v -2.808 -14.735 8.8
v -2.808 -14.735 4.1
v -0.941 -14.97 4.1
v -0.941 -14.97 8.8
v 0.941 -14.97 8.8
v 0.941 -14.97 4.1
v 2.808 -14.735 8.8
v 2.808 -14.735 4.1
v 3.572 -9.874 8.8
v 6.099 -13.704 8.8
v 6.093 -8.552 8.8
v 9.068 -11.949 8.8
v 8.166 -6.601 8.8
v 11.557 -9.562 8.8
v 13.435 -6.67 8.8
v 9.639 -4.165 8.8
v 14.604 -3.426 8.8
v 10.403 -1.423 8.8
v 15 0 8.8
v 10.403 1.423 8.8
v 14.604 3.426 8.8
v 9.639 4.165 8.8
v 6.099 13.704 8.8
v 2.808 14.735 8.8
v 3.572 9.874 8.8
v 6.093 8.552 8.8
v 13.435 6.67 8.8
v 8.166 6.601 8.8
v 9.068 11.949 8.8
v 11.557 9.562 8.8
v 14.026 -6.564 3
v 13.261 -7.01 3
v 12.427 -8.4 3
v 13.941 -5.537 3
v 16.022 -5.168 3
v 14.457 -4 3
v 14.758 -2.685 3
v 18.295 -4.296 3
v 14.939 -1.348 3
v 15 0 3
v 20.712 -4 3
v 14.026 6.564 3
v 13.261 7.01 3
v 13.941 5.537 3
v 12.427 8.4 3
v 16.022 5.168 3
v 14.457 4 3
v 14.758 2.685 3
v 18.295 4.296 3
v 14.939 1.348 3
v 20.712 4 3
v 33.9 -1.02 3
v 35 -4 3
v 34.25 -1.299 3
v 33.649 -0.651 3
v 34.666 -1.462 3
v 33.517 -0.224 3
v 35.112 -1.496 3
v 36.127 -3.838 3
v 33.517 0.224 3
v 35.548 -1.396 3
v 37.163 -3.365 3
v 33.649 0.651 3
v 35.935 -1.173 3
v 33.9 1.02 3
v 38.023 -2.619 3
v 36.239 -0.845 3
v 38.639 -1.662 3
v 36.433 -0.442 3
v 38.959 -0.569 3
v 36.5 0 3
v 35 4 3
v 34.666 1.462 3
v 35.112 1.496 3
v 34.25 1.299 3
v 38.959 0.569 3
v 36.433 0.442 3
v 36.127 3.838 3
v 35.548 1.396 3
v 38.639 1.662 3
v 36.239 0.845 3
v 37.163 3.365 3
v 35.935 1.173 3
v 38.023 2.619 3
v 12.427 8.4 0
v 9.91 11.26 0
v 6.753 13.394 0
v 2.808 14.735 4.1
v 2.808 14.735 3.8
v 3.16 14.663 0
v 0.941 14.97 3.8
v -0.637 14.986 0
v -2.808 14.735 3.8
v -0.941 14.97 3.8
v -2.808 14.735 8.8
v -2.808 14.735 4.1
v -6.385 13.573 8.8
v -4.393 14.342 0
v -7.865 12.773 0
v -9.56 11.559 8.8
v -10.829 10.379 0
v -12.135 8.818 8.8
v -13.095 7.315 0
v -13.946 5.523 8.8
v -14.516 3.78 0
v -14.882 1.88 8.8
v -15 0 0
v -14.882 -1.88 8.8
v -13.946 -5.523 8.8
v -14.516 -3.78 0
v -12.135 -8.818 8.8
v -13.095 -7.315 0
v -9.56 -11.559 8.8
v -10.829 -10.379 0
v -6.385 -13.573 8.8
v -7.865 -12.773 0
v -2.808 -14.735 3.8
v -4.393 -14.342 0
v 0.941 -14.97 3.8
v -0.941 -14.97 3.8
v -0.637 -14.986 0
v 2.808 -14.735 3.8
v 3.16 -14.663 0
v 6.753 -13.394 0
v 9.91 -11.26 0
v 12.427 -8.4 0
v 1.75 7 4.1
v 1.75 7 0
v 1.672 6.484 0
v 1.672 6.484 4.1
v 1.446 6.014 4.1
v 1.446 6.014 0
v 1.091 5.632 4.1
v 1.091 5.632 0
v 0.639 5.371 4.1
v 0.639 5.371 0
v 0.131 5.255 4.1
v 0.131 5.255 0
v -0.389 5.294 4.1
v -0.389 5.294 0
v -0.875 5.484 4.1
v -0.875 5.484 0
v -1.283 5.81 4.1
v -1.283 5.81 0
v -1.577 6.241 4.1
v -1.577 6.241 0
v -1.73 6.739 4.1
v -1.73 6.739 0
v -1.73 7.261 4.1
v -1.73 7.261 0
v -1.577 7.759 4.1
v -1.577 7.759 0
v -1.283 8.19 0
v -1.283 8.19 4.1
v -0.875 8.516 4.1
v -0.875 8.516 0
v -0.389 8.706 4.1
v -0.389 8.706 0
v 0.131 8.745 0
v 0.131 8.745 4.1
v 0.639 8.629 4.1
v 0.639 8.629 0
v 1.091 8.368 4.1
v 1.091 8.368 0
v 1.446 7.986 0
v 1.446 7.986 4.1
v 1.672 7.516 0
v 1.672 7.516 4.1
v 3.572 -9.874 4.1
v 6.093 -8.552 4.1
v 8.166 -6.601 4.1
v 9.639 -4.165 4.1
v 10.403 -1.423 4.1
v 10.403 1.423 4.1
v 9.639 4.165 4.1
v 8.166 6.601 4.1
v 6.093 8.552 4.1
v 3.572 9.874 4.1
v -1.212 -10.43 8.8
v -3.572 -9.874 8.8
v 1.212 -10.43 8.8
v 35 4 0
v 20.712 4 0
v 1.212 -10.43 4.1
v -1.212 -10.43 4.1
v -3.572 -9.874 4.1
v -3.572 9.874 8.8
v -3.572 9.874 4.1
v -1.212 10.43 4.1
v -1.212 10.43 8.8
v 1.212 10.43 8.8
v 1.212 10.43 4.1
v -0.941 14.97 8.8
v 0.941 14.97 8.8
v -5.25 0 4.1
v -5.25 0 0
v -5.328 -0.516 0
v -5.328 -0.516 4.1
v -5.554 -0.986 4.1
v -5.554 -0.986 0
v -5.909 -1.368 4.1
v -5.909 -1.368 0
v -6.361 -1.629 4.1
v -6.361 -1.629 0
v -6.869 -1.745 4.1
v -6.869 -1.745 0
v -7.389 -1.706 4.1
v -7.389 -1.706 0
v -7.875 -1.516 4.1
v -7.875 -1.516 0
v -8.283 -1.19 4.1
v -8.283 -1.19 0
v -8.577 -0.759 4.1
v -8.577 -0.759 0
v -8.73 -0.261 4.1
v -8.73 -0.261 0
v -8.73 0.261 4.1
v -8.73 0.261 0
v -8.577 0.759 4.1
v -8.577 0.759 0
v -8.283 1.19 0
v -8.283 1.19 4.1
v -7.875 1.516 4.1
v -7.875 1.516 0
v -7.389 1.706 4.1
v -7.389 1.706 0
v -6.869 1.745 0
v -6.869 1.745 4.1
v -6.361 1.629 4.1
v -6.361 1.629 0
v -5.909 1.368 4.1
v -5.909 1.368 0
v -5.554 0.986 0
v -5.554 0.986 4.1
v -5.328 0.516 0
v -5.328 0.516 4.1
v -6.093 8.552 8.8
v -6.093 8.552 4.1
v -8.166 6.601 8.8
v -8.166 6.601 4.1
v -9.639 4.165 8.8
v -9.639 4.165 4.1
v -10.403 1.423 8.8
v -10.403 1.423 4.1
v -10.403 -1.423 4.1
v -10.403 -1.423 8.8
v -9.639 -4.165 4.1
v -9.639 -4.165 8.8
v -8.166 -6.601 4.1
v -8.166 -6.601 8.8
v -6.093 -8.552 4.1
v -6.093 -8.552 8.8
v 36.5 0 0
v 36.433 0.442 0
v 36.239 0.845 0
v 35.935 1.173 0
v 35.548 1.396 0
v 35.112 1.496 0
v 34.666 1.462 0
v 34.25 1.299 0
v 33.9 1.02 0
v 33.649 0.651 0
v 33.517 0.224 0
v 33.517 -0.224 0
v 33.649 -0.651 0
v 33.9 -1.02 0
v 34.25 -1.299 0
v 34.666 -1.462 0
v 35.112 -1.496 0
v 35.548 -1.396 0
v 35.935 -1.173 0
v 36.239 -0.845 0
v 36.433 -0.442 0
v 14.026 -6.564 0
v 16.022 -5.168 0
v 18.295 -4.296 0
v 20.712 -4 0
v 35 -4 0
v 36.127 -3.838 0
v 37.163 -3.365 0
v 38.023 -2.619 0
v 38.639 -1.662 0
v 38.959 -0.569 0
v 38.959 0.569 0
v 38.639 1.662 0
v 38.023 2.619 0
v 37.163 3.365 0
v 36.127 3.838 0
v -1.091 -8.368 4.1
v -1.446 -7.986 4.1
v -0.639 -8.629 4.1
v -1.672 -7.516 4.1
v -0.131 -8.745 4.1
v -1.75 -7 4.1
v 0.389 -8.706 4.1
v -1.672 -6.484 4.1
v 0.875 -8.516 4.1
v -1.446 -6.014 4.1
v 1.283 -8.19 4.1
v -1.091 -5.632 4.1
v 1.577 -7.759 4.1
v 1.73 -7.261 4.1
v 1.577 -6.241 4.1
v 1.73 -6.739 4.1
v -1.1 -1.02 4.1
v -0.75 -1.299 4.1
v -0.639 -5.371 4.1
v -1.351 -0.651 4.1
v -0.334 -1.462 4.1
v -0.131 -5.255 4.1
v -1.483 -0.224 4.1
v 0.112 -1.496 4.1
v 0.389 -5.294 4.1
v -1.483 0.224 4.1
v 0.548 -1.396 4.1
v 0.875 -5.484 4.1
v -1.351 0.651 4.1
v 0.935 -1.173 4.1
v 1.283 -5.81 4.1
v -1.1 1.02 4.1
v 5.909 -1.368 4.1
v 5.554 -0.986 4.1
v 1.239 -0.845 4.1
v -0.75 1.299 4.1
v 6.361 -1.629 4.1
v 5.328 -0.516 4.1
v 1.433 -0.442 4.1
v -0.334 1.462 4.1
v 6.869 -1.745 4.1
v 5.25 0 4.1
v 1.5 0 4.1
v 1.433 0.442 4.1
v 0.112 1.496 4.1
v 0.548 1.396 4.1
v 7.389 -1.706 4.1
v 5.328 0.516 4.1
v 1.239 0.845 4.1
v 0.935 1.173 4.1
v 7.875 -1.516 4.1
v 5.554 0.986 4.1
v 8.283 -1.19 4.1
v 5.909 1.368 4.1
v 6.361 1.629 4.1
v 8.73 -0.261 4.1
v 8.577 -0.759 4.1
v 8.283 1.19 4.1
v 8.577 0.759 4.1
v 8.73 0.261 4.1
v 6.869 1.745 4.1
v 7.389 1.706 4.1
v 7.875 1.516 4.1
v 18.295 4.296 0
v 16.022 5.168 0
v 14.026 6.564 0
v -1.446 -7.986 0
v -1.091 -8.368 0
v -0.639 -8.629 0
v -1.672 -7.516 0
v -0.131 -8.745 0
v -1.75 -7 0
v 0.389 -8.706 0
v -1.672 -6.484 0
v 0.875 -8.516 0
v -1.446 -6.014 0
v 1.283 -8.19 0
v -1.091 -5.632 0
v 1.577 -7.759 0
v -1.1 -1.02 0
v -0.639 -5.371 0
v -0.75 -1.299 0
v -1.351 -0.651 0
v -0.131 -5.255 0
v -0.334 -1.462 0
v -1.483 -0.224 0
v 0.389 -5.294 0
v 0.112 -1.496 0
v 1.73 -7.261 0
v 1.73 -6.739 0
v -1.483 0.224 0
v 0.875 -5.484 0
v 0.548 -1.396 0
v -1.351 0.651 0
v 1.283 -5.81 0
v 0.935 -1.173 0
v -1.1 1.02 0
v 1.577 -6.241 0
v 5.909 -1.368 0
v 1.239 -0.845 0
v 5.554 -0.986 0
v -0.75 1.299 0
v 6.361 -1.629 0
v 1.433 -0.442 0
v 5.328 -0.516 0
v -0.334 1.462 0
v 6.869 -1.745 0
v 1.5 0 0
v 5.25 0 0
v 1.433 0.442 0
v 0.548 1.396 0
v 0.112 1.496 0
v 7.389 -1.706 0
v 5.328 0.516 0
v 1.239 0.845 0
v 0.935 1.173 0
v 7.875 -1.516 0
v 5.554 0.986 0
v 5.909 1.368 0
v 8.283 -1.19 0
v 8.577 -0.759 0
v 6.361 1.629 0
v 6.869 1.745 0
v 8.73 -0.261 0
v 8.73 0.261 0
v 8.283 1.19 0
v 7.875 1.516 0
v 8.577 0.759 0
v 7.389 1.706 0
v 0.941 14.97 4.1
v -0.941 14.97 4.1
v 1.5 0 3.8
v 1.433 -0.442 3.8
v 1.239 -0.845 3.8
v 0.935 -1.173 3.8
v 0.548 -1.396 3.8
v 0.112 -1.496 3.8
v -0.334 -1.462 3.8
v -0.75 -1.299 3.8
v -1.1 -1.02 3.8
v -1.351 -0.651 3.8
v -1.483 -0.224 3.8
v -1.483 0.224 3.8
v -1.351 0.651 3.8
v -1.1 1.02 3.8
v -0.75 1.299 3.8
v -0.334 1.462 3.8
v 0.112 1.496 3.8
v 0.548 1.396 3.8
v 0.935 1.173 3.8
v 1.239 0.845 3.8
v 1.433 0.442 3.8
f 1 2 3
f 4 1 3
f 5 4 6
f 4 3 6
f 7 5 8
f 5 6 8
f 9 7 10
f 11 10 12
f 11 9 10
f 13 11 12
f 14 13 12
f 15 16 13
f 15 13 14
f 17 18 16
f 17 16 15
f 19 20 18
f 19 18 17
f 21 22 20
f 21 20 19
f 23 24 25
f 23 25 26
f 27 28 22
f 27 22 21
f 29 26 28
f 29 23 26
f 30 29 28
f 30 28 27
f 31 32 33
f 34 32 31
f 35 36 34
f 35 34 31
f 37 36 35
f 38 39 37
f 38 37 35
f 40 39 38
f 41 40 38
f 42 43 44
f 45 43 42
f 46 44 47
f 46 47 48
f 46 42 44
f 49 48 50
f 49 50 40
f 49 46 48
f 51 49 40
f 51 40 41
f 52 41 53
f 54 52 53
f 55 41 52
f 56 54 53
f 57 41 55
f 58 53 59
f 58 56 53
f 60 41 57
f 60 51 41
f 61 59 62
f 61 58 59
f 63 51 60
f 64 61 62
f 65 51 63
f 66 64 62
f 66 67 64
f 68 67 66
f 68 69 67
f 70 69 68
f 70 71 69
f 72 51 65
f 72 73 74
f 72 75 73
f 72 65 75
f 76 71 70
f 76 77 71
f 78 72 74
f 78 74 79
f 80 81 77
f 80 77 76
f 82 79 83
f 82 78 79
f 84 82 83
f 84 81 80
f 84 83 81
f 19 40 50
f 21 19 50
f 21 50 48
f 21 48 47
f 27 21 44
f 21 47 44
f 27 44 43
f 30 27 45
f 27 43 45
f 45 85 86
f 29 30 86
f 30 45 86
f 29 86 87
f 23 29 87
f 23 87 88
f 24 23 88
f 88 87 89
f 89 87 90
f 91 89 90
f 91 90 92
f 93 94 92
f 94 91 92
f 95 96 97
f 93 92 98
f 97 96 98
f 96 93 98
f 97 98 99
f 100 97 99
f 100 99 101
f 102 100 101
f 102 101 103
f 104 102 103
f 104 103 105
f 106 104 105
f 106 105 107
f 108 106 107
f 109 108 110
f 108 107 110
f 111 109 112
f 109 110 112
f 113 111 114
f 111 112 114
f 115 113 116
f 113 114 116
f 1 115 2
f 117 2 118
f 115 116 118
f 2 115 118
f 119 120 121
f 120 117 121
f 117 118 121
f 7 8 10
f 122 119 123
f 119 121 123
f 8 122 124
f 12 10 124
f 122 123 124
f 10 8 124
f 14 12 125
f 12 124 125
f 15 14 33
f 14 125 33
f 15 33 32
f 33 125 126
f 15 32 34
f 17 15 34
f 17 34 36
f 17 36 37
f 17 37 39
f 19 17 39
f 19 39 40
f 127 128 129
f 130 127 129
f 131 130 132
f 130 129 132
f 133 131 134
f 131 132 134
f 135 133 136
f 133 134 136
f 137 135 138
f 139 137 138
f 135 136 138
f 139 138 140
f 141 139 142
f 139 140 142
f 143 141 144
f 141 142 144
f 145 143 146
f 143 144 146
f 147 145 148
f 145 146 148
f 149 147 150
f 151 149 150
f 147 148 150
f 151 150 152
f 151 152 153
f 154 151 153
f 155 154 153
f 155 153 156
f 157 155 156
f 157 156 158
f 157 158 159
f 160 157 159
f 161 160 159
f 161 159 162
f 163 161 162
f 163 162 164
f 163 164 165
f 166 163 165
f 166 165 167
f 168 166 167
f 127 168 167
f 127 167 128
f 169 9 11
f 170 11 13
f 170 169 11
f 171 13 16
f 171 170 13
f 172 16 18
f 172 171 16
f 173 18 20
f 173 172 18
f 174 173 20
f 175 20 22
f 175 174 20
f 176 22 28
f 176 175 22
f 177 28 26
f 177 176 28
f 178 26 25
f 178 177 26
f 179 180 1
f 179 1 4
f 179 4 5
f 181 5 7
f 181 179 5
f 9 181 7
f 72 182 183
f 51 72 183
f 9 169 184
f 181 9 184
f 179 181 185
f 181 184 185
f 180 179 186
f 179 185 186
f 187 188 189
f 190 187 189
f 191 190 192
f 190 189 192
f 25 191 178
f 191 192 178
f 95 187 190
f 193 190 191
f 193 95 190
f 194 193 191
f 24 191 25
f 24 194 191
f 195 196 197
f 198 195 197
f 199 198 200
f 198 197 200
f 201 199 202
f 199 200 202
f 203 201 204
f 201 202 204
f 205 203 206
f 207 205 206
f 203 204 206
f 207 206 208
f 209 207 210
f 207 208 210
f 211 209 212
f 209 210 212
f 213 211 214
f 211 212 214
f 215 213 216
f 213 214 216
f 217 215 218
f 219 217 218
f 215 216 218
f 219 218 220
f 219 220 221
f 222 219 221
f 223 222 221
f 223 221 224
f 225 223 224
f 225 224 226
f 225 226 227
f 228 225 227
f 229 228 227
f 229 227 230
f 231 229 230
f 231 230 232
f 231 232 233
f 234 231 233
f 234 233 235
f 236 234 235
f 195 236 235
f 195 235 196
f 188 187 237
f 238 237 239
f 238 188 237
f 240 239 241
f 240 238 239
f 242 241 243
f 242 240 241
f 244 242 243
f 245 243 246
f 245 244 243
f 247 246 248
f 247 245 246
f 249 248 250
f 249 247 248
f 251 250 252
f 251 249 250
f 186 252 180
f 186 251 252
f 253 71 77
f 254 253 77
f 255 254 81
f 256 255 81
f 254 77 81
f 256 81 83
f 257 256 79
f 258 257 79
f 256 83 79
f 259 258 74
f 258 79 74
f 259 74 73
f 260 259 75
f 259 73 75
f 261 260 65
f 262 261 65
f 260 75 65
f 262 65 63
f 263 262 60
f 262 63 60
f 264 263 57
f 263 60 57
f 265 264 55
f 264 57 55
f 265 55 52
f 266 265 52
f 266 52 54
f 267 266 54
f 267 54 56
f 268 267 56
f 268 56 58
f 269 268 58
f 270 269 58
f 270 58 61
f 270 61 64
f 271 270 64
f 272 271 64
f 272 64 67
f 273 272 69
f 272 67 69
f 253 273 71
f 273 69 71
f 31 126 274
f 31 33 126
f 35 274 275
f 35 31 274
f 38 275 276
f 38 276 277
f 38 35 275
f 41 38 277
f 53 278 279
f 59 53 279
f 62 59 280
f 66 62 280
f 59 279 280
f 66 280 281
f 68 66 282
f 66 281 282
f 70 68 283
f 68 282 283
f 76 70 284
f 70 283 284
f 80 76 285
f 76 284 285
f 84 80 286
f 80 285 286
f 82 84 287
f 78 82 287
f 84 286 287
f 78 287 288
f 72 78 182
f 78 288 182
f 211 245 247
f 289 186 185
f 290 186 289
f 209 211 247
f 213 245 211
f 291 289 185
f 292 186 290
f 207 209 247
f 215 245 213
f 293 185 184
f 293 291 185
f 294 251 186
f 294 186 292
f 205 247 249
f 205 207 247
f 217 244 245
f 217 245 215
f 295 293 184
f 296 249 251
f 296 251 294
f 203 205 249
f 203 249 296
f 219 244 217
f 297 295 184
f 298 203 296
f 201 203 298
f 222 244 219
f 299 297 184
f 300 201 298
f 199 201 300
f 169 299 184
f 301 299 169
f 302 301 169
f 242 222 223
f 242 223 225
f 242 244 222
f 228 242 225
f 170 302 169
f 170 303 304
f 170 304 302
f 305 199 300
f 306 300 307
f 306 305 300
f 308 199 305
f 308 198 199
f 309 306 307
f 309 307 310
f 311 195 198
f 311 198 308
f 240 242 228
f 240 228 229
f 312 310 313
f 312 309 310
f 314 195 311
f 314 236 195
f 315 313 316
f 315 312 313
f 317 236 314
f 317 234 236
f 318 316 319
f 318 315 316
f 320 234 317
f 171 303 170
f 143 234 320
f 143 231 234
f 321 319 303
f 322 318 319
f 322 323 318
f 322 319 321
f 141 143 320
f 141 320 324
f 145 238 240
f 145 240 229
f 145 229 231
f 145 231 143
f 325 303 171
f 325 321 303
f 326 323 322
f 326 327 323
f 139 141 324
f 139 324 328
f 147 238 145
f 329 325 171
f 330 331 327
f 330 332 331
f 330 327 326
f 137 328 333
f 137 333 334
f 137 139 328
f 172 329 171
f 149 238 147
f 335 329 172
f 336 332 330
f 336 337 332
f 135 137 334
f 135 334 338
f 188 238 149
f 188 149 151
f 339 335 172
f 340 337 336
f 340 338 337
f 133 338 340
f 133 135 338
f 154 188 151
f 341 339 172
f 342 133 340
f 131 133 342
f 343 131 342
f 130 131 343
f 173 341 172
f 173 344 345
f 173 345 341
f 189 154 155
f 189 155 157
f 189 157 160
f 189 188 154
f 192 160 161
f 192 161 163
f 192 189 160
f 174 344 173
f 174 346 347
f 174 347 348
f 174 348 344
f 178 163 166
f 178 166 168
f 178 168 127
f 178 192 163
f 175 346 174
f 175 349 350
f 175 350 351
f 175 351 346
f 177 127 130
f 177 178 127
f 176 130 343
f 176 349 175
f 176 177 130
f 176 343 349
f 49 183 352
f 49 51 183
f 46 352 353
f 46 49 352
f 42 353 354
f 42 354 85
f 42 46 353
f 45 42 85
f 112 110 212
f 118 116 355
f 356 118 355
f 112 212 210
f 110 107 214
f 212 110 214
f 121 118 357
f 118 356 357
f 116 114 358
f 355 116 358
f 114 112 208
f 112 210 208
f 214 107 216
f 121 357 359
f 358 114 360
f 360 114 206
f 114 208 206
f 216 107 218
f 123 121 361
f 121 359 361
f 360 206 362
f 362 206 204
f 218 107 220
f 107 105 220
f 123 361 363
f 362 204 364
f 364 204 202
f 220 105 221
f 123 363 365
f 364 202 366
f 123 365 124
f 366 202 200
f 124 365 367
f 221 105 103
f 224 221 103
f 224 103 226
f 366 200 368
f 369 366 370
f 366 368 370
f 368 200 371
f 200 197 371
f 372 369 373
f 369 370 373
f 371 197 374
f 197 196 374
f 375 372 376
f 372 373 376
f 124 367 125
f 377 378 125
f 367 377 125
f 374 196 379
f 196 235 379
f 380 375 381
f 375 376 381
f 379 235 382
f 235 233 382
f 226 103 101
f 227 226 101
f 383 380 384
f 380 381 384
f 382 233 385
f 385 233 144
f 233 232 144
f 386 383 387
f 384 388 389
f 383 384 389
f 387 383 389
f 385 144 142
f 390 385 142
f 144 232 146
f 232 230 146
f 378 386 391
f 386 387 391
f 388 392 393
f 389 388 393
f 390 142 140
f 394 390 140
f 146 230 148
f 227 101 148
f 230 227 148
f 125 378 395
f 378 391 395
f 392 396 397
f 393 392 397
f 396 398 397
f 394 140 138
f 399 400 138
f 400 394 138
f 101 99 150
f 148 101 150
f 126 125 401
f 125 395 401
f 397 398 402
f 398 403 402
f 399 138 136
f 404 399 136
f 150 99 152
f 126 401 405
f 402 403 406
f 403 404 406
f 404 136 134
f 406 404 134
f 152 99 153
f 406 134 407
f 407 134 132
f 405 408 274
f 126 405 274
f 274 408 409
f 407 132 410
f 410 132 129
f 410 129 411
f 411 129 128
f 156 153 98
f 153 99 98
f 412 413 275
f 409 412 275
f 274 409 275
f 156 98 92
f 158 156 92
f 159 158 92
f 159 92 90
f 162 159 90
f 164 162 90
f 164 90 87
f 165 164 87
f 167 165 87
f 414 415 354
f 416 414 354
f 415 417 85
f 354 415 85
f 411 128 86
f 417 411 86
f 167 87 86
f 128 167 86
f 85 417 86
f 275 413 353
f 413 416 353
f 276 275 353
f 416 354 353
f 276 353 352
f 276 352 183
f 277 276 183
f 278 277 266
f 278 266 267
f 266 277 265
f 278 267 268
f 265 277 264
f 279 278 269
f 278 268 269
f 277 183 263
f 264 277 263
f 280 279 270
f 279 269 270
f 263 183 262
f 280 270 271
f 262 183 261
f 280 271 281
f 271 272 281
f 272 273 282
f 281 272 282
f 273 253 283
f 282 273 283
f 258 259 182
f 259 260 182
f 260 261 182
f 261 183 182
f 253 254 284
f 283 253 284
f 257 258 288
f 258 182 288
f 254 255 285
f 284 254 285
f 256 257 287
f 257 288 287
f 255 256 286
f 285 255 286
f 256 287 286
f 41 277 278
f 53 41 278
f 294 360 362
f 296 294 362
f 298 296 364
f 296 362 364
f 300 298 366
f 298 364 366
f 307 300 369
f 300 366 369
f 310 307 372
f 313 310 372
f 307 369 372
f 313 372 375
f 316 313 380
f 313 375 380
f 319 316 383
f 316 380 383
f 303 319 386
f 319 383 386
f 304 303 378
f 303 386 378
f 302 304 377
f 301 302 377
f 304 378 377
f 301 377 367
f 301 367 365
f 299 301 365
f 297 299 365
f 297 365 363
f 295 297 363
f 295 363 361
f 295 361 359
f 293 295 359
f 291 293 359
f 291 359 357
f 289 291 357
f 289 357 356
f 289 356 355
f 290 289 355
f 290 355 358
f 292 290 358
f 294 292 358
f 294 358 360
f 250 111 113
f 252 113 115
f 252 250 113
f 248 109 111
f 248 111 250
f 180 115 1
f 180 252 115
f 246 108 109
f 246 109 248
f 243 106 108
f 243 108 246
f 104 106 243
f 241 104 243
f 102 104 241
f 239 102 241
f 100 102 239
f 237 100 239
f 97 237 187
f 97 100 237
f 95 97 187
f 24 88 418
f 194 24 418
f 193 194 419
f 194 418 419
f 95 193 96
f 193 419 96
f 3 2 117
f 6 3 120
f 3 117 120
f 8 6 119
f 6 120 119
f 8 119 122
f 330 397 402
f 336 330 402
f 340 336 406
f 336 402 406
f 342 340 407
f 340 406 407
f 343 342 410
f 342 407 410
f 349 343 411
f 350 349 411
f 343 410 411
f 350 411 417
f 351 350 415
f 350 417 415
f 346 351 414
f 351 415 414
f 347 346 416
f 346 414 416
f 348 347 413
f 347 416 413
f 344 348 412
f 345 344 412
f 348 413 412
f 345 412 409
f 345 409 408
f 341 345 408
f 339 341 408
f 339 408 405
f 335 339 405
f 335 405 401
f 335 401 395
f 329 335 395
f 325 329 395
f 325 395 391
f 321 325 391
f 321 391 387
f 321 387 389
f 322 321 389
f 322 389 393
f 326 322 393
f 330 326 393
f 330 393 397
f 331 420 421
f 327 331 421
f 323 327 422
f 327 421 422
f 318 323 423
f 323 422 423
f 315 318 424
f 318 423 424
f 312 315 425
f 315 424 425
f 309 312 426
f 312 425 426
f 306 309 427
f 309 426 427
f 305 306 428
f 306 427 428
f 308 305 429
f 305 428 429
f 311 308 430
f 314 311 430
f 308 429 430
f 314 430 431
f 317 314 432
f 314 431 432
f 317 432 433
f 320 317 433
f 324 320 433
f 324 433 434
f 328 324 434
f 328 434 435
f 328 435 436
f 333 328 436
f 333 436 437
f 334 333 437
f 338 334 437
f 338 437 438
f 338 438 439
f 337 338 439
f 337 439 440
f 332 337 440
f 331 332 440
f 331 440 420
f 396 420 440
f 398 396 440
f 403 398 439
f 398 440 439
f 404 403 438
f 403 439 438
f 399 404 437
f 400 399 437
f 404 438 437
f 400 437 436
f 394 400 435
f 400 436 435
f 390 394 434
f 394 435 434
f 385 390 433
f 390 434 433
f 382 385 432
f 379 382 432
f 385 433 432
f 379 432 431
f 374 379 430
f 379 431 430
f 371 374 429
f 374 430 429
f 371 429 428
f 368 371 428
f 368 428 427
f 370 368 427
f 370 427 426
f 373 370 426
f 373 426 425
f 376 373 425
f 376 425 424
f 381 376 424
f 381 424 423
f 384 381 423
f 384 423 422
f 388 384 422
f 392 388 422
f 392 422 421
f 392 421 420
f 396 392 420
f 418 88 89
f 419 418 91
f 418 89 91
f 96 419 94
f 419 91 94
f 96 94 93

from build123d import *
from build123d.topology import SkipClean

# Parameters (mm, degrees)
SKETCH1_R           = 15
BOSS_EXTRUDE1_DEPTH = 8.8
CUT_EXTRUDE1_DEPTH  = 5
SKETCH3_R           = 1.5
CUT_EXTRUDE2_DEPTH  = 5
BOSS_EXTRUDE2_DEPTH = 3
FILLET1_R           = 10
FILLET2_R           = 10
SKETCH6_R           = 1.5
CUT_EXTRUDE4_DEPTH  = 3
SKETCH7_R           = 10.5
CUT_EXTRUDE6_DEPTH  = 5
BOSS_EXTRUDE3_DEPTH = 0.3
BOSS_EXTRUDE4_START = -4.7
BOSS_EXTRUDE4_DEPTH = 4.7
SKETCH11_R          = 1.5
CUT_EXTRUDE7_DEPTH  = 43.083250825
SKETCH12_R          = 1.75
CUT_EXTRUDE8_DEPTH  = 43.701756404


with BuildPart() as part:
    # Sketch1 → Boss-Extrude1 (new body)
    with BuildSketch(Plane.XY):
        Circle(SKETCH1_R)
    extrude(amount=BOSS_EXTRUDE1_DEPTH)

    # Sketch2 → Cut-Extrude1 (cut)
    with BuildSketch(Plane.XY.offset(8.8)):
        with BuildLine():
            Line((-2.469689731, 16.888114198), (-4.5, 3.968626967))
            ThreePointArc((-4.5, 3.968626967), (-6, 0), (-4.5, -3.968626967))
            Line((-4.5, -3.968626967), (-2.469689731, -16.888114198))
            ThreePointArc((-2.469689731, -16.888114198), (0, -19), (2.469689731, -16.888114198))
            Line((2.469689731, -16.888114198), (4.5, -3.968626967))
            ThreePointArc((4.5, -3.968626967), (6, 0), (4.5, 3.968626967))
            Line((4.5, 3.968626967), (2.469689731, 16.888114198))
            ThreePointArc((2.469689731, 16.888114198), (0, 19), (-2.469689731, 16.888114198))
        make_face()
    extrude(amount=-CUT_EXTRUDE1_DEPTH, mode=Mode.SUBTRACT)

    # Sketch3 → Cut-Extrude2 (cut)
    with BuildSketch(Plane.XY.offset(3.8)):
        Circle(SKETCH3_R)
    extrude(amount=-CUT_EXTRUDE2_DEPTH, mode=Mode.SUBTRACT)

    # Sketch4 → Boss-Extrude2 (add)
    with BuildSketch(Plane(origin=(0, 0, 0), x_dir=(-1, 0, 0), z_dir=(0, 0, -1))):
        with BuildLine():
            Line((-35, 4), (-14.456832295, 4))
            ThreePointArc((-14.456832295, 4), (-15, 0), (-14.456832295, -4))
            Line((-14.456832295, -4), (-35, -4))
            ThreePointArc((-35, -4), (-39, 0), (-35, 4))
        make_face()
    extrude(amount=-BOSS_EXTRUDE2_DEPTH)

    # Fillet1
    fillet1_edges = [part.edges().sort_by_distance(p)[0] for p in [
        (14.456832295, 4, 1.5),
    ]]
    fillet(fillet1_edges, radius=FILLET1_R)

    # Fillet2
    fillet2_edges = [part.edges().sort_by_distance(p)[0] for p in [
        (14.456832295, -4, 1.5),
    ]]
    fillet(fillet2_edges, radius=FILLET2_R)

    # Sketch6 → Cut-Extrude4 (cut)
    with BuildSketch(Plane.XY.offset(3)):
        with Locations((35, 0)):
            Circle(SKETCH6_R)
    extrude(amount=-CUT_EXTRUDE4_DEPTH, mode=Mode.SUBTRACT)

    # Sketch7 → Cut-Extrude6 (cut)
    with BuildSketch(Plane.XY.offset(3.8)):
        Circle(SKETCH7_R)
    extrude(amount=CUT_EXTRUDE6_DEPTH, mode=Mode.SUBTRACT)

    # Sketch8 → Boss-Extrude3 (add)
    with BuildSketch(Plane.XY.offset(3.8)):
        with BuildLine():
            Line((-2.808083405, 14.73481142), (-3.572005324, 9.873741842))
            ThreePointArc((-3.572005324, 9.873741842), (-10.5, 0), (-3.572005324, -9.873741842))
            Line((-3.572005324, -9.873741842), (-2.808083405, -14.73481142))
            ThreePointArc((-2.808083405, -14.73481142), (0, -15), (2.808083405, -14.73481142))
            Line((2.808083405, -14.73481142), (3.572005324, -9.873741842))
            ThreePointArc((3.572005324, -9.873741842), (10.5, 0), (3.572005324, 9.873741842))
            Line((3.572005324, 9.873741842), (2.808083405, 14.73481142))
            ThreePointArc((2.808083405, 14.73481142), (0, 15), (-2.808083405, 14.73481142))
        make_face()
    extrude(amount=BOSS_EXTRUDE3_DEPTH)

    # Sketch9 → Boss-Extrude4 (add)
    with SkipClean():  # the faces are left unmerged after this step: merging them gives an invalid solid
        with BuildSketch(Plane.XY.offset(8.8).offset(BOSS_EXTRUDE4_START)):
            with BuildLine():
                Line((-2.808083405, 14.73481142), (-3.572005324, 9.873741842))
                ThreePointArc((-3.572005324, 9.873741842), (0, 10.5), (3.572005324, 9.873741842))
                Line((3.572005324, 9.873741842), (2.808083405, 14.73481142))
                ThreePointArc((2.808083405, 14.73481142), (0, 15), (-2.808083405, 14.73481142))
            make_face()
            with BuildLine():
                Line((-3.572005324, -9.873741842), (-2.808083405, -14.73481142))
                ThreePointArc((-2.808083405, -14.73481142), (0, -15), (2.808083405, -14.73481142))
                Line((2.808083405, -14.73481142), (3.572005324, -9.873741842))
                ThreePointArc((3.572005324, -9.873741842), (0, -10.5), (-3.572005324, -9.873741842))
            make_face()
        extrude(amount=BOSS_EXTRUDE4_DEPTH)

    # Sketch11 → Cut-Extrude7 (cut, through all)
    with SkipClean():  # the faces are left unmerged after this step: merging them gives an invalid solid
        with BuildSketch(Plane(origin=(0, 0, 3.8), x_dir=(-1, 0, 0), z_dir=(0, 0, -1))):
            with Locations(Location((0, 0, 0), (0, 0, 180))):
                Circle(SKETCH11_R)
        extrude(amount=-CUT_EXTRUDE7_DEPTH, mode=Mode.SUBTRACT)

    # Sketch12 → Cut-Extrude8 (cut, through all)
    with SkipClean():  # the faces are left unmerged after this step: merging them gives an invalid solid
        with BuildSketch(Plane(origin=(0, 0, 0), x_dir=(-1, 0, 0), z_dir=(0, 0, -1))):
            with Locations((0, -7)):
                Circle(SKETCH12_R)
            with Locations((-7, 0)):
                Circle(SKETCH12_R)
            with Locations(Location((7, 0, 0), (0, 0, 180))):
                Circle(SKETCH12_R)
            with Locations(Location((0, 7, 0), (0, 0, 180))):
                Circle(SKETCH12_R)
        extrude(amount=-CUT_EXTRUDE8_DEPTH, mode=Mode.SUBTRACT)


solid = part.part
